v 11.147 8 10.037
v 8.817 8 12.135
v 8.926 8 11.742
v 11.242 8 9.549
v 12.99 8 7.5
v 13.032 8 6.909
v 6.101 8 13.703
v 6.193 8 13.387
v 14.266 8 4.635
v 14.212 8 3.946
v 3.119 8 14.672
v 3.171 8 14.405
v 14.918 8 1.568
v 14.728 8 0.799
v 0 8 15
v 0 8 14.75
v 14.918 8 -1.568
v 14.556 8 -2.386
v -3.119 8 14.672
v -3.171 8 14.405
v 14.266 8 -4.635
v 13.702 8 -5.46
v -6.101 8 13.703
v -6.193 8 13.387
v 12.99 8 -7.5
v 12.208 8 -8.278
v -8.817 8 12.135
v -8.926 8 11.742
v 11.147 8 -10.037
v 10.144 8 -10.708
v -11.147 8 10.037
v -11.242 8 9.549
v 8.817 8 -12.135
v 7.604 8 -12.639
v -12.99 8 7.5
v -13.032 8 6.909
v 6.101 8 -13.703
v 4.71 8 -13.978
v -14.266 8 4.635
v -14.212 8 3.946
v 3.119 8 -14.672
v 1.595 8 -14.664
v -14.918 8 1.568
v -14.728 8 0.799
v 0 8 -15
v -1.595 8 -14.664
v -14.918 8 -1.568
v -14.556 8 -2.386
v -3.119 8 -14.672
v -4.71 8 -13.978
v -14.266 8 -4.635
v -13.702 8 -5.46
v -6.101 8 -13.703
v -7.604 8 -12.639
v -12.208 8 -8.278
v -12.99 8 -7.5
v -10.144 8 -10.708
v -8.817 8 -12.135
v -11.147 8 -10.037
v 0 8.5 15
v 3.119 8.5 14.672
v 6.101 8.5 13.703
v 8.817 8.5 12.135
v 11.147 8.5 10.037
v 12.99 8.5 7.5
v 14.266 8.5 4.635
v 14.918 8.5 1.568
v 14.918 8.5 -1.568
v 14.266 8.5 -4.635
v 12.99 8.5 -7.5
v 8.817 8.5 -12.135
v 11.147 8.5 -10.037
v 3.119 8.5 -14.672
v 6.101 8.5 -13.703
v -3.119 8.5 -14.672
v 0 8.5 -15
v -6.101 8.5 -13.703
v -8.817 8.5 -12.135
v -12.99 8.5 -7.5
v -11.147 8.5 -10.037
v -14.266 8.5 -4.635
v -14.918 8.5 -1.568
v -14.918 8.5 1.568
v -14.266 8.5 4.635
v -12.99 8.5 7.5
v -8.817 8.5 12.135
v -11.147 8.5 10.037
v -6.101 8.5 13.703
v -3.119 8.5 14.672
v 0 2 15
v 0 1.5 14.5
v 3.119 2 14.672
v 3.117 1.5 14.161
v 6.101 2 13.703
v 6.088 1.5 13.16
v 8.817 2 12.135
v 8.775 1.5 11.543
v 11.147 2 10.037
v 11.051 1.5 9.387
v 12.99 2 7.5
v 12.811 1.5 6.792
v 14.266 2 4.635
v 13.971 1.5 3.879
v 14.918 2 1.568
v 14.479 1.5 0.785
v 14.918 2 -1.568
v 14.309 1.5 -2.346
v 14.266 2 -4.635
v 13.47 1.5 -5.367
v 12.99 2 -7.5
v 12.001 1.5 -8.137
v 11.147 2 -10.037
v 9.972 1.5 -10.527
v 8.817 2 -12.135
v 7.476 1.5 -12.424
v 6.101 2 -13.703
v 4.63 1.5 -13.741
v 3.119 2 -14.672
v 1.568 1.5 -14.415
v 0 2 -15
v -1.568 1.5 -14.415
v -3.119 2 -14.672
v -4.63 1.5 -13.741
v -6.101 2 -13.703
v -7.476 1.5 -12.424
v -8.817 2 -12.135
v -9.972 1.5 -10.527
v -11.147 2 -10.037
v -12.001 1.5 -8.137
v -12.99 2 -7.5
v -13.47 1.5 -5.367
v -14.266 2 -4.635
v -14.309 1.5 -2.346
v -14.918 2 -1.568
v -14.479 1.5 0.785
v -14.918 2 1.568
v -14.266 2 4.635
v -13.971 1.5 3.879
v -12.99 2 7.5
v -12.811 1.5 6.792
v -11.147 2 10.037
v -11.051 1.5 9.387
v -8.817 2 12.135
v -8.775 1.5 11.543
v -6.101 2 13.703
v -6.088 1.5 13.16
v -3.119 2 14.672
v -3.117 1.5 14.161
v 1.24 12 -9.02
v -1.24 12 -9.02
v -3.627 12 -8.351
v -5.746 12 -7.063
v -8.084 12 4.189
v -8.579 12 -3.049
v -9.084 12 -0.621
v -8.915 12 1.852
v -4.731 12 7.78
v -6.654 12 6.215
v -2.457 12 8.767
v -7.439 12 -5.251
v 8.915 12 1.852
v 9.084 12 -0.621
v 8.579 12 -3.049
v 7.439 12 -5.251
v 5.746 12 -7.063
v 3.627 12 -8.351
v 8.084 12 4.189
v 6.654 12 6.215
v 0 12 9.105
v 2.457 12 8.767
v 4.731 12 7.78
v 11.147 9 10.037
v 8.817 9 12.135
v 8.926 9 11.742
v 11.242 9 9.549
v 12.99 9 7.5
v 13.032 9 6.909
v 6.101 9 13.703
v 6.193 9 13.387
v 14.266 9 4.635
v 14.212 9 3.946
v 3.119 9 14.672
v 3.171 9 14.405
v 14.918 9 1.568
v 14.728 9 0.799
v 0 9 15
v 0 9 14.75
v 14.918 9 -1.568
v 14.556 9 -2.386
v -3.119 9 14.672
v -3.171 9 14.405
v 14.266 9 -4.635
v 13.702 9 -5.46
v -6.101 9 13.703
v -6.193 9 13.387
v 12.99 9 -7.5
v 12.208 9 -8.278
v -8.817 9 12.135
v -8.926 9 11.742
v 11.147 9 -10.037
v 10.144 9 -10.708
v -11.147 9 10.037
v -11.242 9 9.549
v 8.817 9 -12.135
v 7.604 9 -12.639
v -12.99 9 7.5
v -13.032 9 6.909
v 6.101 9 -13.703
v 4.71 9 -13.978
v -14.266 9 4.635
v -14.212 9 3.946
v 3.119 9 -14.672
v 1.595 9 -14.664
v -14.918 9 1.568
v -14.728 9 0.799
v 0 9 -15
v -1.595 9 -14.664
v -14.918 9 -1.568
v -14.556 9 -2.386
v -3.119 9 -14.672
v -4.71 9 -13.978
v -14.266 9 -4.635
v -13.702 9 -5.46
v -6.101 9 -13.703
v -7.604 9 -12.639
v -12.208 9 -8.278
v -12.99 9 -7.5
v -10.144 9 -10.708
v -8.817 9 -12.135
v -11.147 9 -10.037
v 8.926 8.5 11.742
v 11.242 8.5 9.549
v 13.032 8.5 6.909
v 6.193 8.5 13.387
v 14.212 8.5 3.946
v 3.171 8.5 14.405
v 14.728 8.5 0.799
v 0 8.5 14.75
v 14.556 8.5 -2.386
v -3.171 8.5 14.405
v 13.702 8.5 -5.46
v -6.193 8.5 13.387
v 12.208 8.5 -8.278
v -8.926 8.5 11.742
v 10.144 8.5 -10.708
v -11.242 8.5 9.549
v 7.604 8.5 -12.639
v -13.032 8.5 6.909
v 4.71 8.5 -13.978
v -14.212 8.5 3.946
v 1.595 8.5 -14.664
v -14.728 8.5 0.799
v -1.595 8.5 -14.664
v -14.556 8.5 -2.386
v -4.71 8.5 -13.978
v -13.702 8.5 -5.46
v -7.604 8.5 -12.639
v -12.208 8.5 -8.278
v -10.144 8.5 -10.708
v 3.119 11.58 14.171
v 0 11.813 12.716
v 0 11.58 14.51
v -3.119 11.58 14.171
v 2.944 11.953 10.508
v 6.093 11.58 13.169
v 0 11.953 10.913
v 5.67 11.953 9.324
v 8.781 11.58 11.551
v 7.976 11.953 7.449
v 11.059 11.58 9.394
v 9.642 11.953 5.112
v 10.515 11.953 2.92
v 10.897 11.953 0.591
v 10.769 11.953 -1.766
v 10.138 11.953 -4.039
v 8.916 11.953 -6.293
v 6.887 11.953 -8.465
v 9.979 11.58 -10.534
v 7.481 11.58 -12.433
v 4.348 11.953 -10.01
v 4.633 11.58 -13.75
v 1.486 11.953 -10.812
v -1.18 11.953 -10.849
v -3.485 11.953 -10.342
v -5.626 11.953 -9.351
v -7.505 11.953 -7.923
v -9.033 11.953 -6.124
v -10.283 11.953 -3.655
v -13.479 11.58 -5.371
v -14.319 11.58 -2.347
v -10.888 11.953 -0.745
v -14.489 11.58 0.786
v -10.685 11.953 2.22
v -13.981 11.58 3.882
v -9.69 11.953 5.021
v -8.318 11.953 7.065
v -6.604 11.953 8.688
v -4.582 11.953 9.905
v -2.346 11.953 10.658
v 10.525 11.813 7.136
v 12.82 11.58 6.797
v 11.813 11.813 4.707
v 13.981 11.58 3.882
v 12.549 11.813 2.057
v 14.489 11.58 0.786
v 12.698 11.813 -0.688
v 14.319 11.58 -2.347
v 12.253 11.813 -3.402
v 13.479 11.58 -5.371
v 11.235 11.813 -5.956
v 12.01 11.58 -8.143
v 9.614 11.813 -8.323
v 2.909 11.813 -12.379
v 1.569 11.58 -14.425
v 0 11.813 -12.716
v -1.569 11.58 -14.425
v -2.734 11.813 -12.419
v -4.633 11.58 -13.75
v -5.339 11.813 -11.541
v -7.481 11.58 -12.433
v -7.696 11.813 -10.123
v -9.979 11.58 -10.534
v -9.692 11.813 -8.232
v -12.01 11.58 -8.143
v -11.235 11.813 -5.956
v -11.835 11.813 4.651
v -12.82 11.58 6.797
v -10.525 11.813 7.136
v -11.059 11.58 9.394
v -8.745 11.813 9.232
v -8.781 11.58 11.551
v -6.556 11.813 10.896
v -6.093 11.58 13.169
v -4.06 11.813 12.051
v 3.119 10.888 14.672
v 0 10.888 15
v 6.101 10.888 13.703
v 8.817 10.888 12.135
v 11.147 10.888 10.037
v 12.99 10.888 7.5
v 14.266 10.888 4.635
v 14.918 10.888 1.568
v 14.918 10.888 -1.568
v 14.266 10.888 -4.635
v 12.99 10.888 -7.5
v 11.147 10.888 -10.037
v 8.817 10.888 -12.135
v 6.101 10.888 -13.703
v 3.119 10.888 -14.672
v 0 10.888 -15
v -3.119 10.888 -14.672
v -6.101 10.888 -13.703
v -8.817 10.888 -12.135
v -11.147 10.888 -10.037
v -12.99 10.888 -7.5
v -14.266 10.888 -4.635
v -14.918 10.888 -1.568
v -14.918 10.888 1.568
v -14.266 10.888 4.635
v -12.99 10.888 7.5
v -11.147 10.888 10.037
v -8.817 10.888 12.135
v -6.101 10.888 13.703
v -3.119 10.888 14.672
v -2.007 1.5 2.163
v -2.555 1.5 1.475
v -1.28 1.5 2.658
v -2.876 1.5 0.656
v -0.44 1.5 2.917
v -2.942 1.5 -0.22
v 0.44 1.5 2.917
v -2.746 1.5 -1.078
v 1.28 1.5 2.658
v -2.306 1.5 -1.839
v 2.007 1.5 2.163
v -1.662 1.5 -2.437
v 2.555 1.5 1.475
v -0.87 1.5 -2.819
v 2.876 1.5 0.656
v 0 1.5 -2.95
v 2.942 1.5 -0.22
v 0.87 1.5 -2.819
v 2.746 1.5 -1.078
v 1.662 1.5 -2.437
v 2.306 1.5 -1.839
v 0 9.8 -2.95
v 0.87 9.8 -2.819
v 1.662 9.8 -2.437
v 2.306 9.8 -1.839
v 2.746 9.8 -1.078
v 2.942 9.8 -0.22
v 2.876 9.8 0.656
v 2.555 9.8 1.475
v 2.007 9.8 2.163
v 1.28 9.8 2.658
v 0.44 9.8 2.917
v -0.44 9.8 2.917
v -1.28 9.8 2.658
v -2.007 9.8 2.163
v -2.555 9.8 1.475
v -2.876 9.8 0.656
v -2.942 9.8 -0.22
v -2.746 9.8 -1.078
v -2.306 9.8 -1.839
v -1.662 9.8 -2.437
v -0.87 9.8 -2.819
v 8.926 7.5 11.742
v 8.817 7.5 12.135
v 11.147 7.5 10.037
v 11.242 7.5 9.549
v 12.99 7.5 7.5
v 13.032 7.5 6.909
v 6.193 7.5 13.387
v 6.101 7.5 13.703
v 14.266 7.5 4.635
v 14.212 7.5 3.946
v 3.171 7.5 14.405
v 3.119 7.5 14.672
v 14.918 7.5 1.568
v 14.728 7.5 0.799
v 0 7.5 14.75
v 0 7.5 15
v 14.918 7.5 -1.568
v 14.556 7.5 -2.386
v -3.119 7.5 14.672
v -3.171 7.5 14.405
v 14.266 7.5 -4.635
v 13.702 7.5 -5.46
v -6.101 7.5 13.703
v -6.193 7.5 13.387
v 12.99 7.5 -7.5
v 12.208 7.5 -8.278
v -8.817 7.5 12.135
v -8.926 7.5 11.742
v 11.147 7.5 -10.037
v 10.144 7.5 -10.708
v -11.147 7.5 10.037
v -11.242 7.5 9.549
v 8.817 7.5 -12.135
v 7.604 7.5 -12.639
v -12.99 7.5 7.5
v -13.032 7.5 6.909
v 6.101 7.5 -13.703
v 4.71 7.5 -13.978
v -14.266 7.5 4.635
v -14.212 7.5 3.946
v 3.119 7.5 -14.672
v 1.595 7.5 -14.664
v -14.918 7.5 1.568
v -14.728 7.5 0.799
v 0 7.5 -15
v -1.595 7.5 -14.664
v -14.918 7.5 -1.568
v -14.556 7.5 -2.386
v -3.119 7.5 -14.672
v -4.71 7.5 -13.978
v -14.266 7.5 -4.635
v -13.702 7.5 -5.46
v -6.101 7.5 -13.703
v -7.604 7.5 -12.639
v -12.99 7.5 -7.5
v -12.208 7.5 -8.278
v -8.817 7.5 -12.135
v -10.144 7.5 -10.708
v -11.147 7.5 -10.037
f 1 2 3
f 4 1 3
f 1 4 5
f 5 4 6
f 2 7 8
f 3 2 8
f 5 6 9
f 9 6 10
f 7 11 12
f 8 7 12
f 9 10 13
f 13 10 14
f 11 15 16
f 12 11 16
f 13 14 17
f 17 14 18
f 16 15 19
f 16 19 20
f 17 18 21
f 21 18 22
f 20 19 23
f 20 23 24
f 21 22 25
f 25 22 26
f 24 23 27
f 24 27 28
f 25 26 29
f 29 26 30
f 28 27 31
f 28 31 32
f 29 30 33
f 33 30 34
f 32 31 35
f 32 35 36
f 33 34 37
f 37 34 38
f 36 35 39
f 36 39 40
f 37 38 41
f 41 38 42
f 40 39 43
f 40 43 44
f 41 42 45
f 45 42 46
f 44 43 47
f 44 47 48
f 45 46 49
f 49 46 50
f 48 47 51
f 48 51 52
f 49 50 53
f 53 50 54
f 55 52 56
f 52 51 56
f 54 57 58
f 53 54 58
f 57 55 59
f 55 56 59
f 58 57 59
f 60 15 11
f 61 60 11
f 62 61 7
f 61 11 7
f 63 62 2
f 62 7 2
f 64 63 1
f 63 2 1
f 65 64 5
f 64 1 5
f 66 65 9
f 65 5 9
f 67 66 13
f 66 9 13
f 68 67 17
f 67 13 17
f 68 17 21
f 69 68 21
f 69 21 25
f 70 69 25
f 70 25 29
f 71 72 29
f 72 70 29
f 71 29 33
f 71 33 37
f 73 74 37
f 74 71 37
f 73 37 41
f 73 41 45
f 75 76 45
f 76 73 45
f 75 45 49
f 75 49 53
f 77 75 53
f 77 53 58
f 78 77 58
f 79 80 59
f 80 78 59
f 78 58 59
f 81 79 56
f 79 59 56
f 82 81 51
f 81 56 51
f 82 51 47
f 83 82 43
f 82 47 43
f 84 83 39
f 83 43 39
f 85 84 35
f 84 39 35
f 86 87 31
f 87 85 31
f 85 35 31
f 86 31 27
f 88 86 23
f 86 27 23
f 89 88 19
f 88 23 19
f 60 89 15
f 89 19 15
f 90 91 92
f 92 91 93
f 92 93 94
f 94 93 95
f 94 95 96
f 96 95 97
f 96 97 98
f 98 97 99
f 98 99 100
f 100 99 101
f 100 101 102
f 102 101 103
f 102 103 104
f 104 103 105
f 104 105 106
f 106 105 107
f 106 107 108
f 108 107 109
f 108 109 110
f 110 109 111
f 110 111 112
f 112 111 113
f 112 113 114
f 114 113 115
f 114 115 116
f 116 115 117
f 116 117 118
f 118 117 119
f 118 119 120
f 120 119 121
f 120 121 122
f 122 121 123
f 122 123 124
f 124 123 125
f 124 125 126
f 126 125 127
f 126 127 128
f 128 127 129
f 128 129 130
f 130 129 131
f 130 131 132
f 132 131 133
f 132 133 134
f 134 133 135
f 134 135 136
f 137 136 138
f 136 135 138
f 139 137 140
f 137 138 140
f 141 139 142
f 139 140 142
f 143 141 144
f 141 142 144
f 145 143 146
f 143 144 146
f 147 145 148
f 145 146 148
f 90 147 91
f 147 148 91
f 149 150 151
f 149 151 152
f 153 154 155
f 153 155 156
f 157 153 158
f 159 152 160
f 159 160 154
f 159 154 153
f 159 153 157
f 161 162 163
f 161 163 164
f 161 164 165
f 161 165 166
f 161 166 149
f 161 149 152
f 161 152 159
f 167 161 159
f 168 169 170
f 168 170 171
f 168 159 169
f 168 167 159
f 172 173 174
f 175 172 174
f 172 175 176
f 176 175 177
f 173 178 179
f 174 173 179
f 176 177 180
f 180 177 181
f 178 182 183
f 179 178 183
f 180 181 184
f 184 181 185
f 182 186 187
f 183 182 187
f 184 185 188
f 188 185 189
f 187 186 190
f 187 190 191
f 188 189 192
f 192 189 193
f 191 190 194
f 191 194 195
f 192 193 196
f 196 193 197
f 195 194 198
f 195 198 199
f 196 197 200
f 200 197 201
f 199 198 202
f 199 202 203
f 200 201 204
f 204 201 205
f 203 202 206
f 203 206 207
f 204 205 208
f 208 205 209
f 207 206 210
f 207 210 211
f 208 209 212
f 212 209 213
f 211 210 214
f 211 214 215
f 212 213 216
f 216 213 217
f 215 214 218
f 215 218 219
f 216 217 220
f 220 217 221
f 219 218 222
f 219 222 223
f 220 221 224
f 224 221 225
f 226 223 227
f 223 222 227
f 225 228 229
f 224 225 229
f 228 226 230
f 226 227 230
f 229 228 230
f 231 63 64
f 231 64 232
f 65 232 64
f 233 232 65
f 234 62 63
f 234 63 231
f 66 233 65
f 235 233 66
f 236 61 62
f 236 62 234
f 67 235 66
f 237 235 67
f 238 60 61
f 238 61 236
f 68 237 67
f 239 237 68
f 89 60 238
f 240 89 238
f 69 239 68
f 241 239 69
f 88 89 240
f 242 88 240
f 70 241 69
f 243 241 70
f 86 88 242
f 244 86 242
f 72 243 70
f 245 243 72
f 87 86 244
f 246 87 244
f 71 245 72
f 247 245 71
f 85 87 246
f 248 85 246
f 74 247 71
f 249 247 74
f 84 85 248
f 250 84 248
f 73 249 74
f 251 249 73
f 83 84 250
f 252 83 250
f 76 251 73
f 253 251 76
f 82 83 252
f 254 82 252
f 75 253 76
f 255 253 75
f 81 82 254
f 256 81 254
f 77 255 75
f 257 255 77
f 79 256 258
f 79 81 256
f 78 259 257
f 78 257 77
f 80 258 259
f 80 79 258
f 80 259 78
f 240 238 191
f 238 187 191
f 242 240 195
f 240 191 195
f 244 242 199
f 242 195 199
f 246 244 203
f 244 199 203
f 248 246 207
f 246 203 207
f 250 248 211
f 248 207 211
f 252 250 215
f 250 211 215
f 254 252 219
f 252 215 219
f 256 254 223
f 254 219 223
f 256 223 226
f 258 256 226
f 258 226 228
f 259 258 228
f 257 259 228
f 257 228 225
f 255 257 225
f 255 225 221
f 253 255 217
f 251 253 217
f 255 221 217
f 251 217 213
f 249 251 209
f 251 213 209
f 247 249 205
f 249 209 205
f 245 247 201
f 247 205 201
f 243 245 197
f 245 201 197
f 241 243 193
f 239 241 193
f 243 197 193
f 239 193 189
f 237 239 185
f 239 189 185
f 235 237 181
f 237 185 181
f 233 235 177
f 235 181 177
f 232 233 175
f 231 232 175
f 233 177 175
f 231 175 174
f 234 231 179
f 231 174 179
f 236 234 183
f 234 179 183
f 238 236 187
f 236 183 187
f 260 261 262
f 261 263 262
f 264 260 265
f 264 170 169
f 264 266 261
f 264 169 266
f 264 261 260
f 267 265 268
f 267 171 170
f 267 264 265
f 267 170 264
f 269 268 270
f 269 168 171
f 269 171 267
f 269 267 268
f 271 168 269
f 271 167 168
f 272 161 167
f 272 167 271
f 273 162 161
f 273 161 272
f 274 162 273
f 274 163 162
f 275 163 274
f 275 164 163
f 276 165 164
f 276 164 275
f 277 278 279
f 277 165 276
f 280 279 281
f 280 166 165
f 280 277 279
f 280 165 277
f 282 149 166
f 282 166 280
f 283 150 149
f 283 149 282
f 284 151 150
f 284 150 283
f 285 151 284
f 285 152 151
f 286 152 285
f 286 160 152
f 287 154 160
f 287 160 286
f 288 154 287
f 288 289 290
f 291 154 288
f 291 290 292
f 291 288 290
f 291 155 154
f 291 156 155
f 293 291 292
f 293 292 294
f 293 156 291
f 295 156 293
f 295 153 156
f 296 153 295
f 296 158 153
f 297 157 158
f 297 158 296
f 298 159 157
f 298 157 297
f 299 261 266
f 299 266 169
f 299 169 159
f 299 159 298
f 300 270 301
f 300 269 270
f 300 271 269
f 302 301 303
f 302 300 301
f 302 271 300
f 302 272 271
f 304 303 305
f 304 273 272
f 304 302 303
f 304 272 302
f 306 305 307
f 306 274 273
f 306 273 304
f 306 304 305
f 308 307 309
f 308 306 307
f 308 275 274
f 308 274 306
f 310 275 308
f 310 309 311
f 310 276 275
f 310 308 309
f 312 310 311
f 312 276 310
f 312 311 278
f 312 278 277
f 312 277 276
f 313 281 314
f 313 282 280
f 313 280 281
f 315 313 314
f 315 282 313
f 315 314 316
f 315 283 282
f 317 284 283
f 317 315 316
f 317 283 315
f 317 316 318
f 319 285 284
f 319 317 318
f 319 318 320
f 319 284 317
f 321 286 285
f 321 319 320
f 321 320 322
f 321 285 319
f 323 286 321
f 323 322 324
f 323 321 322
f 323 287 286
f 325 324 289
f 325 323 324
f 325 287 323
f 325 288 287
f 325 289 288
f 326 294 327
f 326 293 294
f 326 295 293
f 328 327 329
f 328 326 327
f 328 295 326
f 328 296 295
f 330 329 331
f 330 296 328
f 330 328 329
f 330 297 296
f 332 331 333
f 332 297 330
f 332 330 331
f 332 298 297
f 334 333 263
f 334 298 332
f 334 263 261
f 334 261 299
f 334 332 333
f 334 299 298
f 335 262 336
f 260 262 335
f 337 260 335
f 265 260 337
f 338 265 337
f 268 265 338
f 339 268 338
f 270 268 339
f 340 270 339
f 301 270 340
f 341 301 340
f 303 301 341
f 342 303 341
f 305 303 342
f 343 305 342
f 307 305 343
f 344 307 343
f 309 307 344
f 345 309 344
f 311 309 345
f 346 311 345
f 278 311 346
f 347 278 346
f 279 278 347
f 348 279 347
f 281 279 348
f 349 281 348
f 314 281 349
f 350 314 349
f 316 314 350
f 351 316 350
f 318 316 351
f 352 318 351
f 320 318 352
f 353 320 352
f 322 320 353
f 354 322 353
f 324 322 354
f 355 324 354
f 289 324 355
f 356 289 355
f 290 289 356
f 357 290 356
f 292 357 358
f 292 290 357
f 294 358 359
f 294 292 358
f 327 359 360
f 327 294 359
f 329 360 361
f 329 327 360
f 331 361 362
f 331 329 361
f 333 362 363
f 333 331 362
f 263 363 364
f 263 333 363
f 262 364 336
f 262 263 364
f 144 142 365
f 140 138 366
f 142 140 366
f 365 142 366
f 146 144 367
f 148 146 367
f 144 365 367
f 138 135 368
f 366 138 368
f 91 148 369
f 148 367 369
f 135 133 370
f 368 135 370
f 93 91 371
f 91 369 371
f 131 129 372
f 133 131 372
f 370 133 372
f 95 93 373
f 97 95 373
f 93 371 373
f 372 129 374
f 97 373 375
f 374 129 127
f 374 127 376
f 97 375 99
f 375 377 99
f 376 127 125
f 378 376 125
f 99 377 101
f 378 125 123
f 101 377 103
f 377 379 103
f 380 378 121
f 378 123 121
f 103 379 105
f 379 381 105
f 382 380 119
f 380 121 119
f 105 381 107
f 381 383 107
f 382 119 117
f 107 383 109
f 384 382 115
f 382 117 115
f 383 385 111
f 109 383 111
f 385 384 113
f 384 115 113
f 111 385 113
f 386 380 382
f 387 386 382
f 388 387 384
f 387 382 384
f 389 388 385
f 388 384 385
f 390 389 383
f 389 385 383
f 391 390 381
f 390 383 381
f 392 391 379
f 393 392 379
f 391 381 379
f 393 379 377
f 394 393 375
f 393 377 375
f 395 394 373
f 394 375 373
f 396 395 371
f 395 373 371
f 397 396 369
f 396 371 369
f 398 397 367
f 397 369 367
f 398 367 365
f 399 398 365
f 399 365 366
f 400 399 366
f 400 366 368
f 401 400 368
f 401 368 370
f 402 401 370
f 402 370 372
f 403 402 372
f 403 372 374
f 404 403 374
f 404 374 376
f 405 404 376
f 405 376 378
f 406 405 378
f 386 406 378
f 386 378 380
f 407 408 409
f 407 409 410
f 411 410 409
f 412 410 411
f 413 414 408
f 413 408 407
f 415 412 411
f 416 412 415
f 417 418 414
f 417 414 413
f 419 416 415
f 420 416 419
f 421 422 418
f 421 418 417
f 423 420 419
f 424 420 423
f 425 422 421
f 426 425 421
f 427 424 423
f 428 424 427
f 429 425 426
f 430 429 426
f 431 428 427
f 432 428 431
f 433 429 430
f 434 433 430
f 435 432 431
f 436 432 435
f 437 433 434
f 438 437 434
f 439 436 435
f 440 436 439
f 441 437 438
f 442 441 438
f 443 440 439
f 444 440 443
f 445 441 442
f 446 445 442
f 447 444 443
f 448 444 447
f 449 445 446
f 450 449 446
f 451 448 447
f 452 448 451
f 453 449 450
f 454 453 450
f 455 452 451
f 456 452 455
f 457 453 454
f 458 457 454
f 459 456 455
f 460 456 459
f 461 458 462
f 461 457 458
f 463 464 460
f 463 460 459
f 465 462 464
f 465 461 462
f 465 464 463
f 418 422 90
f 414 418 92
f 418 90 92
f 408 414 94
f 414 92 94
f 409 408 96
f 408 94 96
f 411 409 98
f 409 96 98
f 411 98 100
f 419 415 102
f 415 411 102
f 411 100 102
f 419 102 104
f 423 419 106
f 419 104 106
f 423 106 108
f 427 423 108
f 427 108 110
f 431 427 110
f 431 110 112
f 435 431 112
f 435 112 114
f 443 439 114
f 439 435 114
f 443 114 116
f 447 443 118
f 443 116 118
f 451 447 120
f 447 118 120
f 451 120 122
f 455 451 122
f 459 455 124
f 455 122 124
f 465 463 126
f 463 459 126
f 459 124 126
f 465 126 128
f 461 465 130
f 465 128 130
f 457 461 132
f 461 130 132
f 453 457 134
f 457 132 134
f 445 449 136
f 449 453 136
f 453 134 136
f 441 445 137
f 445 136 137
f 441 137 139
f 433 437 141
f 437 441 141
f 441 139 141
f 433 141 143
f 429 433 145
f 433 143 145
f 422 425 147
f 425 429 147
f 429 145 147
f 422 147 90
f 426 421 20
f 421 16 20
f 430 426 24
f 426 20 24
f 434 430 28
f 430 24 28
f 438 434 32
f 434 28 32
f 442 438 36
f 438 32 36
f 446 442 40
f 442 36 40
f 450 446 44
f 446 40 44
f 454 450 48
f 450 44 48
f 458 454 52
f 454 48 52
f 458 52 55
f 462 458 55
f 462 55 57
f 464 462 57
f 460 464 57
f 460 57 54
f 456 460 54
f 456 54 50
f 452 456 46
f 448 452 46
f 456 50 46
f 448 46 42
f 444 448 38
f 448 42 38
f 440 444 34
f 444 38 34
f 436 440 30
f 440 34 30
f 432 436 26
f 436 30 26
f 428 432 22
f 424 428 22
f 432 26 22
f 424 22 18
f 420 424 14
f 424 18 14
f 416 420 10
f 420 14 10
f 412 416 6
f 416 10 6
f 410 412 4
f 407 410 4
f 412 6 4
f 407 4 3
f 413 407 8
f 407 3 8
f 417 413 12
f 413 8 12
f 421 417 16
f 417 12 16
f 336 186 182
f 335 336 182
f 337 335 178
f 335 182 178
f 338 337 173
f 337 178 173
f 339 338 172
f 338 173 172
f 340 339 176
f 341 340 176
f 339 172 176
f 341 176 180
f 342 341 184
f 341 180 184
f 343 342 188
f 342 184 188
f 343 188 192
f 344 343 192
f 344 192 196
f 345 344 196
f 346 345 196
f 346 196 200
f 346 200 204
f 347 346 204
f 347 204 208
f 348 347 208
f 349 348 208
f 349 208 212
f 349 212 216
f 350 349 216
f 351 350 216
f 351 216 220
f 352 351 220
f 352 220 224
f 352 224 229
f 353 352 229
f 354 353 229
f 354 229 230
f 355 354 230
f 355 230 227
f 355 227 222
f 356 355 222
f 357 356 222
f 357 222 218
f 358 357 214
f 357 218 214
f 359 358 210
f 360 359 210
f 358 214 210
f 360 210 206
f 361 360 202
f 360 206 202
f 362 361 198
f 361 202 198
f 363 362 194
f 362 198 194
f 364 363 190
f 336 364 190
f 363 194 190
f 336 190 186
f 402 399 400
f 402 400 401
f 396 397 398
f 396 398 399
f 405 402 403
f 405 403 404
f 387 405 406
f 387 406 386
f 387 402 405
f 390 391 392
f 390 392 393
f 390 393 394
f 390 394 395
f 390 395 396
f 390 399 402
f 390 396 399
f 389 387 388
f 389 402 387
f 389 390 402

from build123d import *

# Parameters (mm, degrees)
SKETCH1_R               = 15
BOSS_EXTRUDE1_DEPTH     = 12
SKETCH2_R               = 2.95
CUT_EXTRUDE1_DEPTH      = 9.8
SKETCH3_W               = 0.578198398
SKETCH3_H               = 0.5
CHAMFER1_SIZE           = 0.5
FILLET1_R               = 35
CHAMFER3_SIZE           = 0.611779298
CUT_EXTRUDE2_DEPTH      = 25.372115214
CUT_EXTRUDE2_DEPTH_BACK = 25.372115214
SKETCH5_W               = 30
SKETCH5_H               = 1.5
CHAMFER4_SIZE           = 0.5


with BuildPart() as part:
    # Sketch1 → Boss-Extrude1 (new body)
    with BuildSketch(Plane(origin=(0, 0, 0), x_dir=(1, 0, 0), z_dir=(0, 1, 0))):
        with Locations(Location((0, 0, 0), (0, 0, 270))):
            Circle(SKETCH1_R)
    extrude(amount=BOSS_EXTRUDE1_DEPTH)

    # Sketch2 → Cut-Extrude1 (cut)
    with BuildSketch(Plane.XZ):
        with Locations(Location((0, 0, 0), (0, 0, 270))):
            Circle(SKETCH2_R)
    extrude(amount=-CUT_EXTRUDE1_DEPTH, mode=Mode.SUBTRACT)

    # Sketch3 → Cut-Revolve1 (revolve, cut)
    with BuildSketch(Plane.XY, mode=Mode.PRIVATE) as cut_revolve1_sk:
        with Locations((15.039099199, 8.75)):
            Rectangle(SKETCH3_W, SKETCH3_H)
        with Locations((15.039099199, 7.75)):
            Rectangle(SKETCH3_W, SKETCH3_H)
    revolve(cut_revolve1_sk.sketch.rotate(Axis((0, 13.00080105, 0), (0, -1, 0)), 90), axis=Axis((0, 13.00080105, 0), (0, -1, 0)), mode=Mode.SUBTRACT)

    # Chamfer1
    chamfer1_edges = [part.edges().sort_by_distance(p)[0] for p in [
        (0, 12, -15),
    ]]
    chamfer(chamfer1_edges, length=CHAMFER1_SIZE)

    # Fillet1
    # the kernel refuses this fillet: 35 mm, written as the material it takes off along each edge
    with BuildSketch(Plane(origin=(0, 12, 0), x_dir=(0, 0, 1), z_dir=(-1, 0, 0))) as fillet1_piece_1:
        with BuildLine():
            CenterArc((9.105086939, -35), FILLET1_R, 80.303678946, 9.696321054)
            Line((9.105086939, 0), (9.105086939, 0.7))
            Line((9.105086939, 0.7), (14.5, 0.7))
            Line((14.5, 0.7), (14.994974747, 0.494974747))
            ThreePointArc((14.994974747, 0.494974747), (15.244974747, 0.244974747), (15.117898261, 0.19))
            Line((15.117898261, 0.19), (15, -0.5))
        make_face()
    revolve(axis=Axis((0, 12, 0), (0, 1, 0)), mode=Mode.SUBTRACT)

    # Chamfer3
    # the kernel refuses this chamfer: 0.611779298, 0.5 mm, written as the material it takes off along each edge
    with BuildSketch(Plane(origin=(0, 11.5, 0), x_dir=(0, 0, 1), z_dir=(-1, 0, 0))) as chamfer3_piece_1:
        with BuildLine():
            Line((15, -CHAMFER3_SIZE), (14.510020918, 0.080148766))
            ThreePointArc((14.510020918, 0.080148766), (14.746676693, 0.042328599), (15, 0))
            Line((15, 0), (15, -CHAMFER3_SIZE))
        make_face()
    revolve(axis=Axis((0, 11.5, 0), (0, 1, 0)), mode=Mode.SUBTRACT)

    # Sketch5 → Cut-Extrude2 (cut, two sides: drawn at the far end of the back side and taken through both)
    with BuildSketch(Plane.XY.offset(-CUT_EXTRUDE2_DEPTH_BACK)):
        with Locations((0, 0.75)):
            Rectangle(SKETCH5_W, SKETCH5_H)
    extrude(amount=CUT_EXTRUDE2_DEPTH + CUT_EXTRUDE2_DEPTH_BACK, mode=Mode.SUBTRACT)

    # Chamfer4
    chamfer4_edges = [part.edges().sort_by_distance(p)[0] for p in [
        (0, 1.5, -15),
    ]]
    chamfer(chamfer4_edges, length=CHAMFER4_SIZE)


solid = part.part
